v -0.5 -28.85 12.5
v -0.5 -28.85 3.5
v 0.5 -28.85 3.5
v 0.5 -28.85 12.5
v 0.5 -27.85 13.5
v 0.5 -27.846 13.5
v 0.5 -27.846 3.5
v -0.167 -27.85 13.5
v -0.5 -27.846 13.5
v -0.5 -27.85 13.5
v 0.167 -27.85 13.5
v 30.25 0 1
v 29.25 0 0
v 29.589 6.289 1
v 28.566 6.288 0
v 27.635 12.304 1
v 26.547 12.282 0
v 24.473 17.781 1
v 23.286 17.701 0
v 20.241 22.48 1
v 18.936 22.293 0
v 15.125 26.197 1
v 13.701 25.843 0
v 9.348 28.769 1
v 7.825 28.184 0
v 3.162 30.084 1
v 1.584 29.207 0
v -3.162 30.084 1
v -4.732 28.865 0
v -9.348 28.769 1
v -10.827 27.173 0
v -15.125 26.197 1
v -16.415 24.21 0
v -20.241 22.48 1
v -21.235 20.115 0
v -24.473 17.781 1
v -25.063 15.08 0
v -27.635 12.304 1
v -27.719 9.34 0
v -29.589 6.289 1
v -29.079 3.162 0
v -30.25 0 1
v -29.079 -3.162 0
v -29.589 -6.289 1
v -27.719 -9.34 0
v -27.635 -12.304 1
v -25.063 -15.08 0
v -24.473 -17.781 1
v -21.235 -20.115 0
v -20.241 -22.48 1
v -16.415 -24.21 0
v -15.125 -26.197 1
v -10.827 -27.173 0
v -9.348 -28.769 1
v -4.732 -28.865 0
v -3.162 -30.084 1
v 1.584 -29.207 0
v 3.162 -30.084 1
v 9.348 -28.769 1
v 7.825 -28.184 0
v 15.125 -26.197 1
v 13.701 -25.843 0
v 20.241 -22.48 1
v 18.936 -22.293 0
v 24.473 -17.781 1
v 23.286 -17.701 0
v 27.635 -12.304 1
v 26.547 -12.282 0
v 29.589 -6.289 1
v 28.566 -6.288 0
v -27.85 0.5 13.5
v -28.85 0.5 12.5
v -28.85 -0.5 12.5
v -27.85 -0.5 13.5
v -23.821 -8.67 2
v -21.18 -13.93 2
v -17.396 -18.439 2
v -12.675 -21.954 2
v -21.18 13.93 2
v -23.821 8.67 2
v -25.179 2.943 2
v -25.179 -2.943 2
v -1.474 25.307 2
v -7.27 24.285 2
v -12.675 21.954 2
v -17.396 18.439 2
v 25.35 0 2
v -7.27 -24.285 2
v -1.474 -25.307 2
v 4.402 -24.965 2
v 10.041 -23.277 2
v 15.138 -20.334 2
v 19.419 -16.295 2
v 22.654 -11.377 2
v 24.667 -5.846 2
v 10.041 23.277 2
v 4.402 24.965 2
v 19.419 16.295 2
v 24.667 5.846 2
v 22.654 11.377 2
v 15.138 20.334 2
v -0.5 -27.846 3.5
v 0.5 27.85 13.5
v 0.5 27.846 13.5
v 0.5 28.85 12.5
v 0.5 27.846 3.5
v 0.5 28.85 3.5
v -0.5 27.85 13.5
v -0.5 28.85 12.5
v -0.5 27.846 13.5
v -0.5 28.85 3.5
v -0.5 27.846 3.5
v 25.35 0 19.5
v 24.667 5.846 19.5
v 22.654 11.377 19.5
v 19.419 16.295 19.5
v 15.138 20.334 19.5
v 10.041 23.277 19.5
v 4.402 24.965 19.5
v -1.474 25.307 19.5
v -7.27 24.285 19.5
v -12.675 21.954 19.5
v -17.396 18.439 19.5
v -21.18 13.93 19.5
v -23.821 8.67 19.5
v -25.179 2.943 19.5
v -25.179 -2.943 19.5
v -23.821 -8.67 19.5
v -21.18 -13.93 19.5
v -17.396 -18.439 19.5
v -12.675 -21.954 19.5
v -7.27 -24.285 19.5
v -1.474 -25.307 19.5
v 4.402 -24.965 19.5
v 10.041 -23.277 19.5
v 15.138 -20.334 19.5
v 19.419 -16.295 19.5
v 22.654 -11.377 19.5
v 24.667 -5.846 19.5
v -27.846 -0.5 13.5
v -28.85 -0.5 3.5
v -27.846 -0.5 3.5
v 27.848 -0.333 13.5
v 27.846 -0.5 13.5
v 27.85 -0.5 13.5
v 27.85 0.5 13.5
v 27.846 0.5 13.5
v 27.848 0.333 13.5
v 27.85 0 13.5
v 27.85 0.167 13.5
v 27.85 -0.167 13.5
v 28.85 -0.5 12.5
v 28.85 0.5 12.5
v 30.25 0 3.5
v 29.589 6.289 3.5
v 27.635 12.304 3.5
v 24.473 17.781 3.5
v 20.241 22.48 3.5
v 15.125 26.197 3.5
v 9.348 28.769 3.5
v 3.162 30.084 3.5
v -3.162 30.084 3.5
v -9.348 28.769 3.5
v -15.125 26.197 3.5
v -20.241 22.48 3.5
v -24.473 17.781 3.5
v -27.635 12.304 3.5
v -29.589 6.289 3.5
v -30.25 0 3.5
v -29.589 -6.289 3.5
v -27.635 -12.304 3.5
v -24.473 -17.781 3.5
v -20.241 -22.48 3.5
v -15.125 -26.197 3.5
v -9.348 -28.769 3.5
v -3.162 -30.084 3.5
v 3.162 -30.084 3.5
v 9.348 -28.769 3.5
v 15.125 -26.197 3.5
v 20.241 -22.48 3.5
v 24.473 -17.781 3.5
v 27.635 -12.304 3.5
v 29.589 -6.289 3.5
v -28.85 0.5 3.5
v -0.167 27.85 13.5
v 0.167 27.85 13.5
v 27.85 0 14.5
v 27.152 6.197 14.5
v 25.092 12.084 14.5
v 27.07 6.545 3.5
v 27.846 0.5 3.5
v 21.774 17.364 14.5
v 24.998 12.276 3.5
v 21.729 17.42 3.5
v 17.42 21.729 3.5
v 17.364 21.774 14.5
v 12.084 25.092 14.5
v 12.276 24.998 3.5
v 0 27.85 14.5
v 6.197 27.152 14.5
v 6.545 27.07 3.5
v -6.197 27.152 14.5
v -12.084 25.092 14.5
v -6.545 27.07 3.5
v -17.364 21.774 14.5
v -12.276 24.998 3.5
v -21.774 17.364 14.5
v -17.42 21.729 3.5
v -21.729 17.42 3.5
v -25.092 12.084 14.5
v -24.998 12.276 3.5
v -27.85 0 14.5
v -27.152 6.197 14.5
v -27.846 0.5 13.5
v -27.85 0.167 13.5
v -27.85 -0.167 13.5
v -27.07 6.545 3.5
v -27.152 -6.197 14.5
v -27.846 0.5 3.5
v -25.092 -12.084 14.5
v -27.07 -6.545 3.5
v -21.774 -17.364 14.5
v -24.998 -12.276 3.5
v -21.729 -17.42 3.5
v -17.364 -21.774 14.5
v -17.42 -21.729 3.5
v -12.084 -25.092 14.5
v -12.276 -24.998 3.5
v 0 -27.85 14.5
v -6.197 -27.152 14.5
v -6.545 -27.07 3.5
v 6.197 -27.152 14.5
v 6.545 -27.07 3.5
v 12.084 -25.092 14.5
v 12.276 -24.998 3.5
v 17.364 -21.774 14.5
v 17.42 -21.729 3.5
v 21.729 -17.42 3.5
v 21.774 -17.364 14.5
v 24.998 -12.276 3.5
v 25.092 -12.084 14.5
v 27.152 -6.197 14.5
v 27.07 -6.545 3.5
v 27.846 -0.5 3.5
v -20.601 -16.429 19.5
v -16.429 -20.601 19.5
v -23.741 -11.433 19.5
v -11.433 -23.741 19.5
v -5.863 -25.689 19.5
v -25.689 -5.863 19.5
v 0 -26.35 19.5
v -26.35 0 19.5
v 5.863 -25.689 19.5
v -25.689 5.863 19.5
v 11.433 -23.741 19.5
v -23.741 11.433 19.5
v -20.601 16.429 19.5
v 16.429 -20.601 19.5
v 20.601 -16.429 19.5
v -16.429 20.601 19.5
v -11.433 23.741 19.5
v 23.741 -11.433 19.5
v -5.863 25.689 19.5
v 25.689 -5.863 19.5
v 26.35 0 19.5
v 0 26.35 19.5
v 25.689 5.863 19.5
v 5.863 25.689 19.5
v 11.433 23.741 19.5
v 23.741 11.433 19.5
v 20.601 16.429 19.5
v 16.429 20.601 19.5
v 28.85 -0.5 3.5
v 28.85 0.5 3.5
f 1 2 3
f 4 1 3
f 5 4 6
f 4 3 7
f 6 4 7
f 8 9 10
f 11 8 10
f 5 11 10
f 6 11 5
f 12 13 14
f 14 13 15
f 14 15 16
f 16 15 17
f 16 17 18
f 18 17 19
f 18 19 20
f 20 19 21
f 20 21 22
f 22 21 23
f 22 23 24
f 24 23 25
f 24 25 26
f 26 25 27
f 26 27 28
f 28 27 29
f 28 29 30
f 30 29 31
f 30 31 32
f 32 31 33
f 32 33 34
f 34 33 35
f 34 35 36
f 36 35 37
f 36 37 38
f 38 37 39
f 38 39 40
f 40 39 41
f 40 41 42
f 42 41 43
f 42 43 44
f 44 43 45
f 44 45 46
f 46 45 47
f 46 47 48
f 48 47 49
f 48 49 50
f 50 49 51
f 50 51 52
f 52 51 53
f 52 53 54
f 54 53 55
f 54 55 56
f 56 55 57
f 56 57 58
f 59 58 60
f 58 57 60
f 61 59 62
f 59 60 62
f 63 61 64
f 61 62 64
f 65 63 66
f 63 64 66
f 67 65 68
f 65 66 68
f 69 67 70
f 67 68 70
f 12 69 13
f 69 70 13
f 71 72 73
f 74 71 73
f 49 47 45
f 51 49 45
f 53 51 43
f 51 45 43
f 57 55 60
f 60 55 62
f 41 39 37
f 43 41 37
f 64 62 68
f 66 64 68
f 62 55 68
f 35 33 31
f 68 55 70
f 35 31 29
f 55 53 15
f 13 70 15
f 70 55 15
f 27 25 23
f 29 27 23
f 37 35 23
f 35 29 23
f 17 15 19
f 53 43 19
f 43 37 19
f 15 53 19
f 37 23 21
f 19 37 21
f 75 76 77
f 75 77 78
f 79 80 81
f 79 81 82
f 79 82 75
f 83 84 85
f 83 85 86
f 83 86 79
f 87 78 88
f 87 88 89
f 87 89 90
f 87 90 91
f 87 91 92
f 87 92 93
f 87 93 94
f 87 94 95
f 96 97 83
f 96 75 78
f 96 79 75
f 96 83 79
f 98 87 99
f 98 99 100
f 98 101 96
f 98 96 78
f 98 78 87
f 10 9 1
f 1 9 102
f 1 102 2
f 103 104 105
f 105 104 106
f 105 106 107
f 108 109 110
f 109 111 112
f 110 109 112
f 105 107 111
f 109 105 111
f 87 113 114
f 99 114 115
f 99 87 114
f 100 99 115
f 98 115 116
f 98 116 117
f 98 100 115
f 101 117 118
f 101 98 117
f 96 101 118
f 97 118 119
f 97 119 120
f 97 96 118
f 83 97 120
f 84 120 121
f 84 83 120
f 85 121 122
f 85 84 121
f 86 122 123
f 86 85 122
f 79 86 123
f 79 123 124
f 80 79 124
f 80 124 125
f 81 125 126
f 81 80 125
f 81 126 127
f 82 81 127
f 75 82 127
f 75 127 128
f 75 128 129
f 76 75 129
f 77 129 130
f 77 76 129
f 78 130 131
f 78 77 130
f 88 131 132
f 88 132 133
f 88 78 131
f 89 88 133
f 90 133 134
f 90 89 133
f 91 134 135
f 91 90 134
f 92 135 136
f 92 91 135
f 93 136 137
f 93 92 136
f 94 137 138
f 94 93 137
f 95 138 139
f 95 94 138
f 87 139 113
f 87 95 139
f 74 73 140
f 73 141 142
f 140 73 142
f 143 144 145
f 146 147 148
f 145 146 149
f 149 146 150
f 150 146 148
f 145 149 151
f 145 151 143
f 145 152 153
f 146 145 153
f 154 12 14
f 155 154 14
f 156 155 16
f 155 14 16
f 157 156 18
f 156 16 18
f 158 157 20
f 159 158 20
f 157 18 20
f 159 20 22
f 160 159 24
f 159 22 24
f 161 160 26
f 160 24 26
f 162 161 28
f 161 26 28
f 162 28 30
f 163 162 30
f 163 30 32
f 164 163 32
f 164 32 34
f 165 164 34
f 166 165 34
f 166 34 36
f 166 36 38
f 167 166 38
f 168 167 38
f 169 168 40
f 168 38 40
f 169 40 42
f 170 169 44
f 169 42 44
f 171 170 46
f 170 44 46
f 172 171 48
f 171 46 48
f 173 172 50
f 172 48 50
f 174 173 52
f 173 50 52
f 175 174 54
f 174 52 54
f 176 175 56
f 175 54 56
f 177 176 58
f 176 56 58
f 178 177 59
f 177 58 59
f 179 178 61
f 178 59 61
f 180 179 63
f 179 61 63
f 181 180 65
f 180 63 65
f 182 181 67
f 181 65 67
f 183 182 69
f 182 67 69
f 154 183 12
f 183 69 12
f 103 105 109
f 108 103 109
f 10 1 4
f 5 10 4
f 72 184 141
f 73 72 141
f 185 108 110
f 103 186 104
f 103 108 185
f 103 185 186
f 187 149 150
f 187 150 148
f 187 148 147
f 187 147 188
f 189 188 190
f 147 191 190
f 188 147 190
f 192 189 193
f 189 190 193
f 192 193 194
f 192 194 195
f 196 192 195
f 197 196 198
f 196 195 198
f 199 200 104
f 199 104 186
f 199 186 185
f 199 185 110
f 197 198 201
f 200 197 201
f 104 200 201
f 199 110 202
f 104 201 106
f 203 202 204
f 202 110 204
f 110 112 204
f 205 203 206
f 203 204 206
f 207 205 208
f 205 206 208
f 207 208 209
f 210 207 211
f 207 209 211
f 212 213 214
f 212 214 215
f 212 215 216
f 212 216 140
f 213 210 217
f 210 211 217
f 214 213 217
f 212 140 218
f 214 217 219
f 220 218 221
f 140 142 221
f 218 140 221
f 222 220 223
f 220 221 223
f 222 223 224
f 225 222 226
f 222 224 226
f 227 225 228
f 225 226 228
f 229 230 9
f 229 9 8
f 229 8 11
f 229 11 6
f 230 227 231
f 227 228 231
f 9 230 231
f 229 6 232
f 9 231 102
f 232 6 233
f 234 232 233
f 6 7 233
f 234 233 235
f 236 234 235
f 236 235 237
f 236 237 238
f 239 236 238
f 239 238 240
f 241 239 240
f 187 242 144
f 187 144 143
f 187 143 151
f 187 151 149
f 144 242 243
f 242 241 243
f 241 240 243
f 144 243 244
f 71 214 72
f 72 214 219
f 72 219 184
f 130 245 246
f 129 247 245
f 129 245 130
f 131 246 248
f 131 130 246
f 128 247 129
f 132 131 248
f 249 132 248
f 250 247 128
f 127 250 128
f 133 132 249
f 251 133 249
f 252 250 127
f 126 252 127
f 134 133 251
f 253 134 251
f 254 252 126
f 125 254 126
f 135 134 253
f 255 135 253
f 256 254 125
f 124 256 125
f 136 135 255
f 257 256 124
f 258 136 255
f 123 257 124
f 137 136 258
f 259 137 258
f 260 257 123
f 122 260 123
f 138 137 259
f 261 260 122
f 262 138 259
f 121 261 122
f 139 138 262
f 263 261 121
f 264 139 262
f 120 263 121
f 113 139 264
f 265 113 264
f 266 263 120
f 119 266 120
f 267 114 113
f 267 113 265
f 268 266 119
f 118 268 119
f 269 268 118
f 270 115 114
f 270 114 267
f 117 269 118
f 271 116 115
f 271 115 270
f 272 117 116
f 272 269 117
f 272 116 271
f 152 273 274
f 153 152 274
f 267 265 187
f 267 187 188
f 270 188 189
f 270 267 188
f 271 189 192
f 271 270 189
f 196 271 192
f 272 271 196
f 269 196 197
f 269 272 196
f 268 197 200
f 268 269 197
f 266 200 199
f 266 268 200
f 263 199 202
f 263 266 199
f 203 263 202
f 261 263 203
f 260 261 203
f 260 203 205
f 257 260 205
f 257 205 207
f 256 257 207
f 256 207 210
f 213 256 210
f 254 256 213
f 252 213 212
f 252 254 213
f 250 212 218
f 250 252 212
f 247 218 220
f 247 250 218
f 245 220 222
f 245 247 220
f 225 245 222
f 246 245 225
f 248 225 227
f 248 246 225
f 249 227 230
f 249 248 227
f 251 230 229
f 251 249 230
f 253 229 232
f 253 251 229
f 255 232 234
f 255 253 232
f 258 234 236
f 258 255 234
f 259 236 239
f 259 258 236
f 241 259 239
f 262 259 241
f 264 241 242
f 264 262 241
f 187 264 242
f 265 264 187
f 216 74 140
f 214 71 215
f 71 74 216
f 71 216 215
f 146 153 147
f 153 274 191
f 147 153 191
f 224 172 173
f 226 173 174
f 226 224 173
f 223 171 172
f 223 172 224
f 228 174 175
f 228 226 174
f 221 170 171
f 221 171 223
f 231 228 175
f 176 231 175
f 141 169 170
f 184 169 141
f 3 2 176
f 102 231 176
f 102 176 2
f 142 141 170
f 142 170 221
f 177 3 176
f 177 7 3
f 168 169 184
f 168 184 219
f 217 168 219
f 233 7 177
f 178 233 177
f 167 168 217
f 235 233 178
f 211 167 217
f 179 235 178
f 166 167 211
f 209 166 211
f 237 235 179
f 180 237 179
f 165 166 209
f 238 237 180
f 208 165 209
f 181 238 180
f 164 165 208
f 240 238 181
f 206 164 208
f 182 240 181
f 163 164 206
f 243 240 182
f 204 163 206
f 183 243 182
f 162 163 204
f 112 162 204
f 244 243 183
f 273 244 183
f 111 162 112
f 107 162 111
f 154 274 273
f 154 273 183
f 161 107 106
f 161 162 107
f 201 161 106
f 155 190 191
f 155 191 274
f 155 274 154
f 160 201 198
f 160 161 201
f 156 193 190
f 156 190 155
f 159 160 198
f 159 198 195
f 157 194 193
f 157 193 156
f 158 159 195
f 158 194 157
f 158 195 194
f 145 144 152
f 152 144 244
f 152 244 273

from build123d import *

# Parameters (mm, degrees)
F0_R      = 30.25
F1_DEPTH  = 3.5
F3_R      = 27.85
F3_R_2    = 25.35
F4_DEPTH  = 10
F5_DEPTH  = 6
F6_SIZE2  = 1.5
F6_SIZE   = 5
F8_DEPTH  = 10
F9_SIZE   = 0.99999
F10_DEPTH = 1.5
F11_SIZE  = 1


# Not quite as in the source:
# - a fillet or chamfer is up to 0.001 mm smaller than in the source, because OpenCascade refuses the exact size


with BuildPart() as f1:
    # F0 (on Top) → F1 (new body)
    with BuildSketch(Plane.XY):
        Circle(F0_R)
    extrude(amount=F1_DEPTH)

    # F3 (on face) → F4 (join)
    with BuildSketch(Plane.XY.offset(3.5)):
        Circle(F3_R)
        Circle(F3_R_2, mode=Mode.SUBTRACT)
    extrude(amount=F4_DEPTH)

    # F5 (add): a face of the model
    f5_faces = [f1.faces().sort_by_distance(p)[0] for p in [
        (-27.0622830458, 0, 13.5),
    ]]
    extrude(f5_faces, amount=F5_DEPTH)

    # F6
    f6_edges = [f1.edges().sort_by_distance(p)[0] for p in [
        (-27.85, 0, 19.5),
    ]]
    f6_side = f1.faces().sort_by_distance((-27.85, 0, 11.5))[0]
    chamfer(f6_edges, length=F6_SIZE, length2=F6_SIZE2, reference=f6_side)

    # F7 (on face) → F8 (join)
    with BuildSketch(Plane.XY.offset(3.5)):
        with BuildLine():
            ThreePointArc((27.85, 0), (27.8488778044, -0.250010074), (27.8455113079, -0.5))
            Line((27.8455113079, -0.5), (28.85, -0.5))
            Line((28.85, -0.5), (28.85, 0.5))
            Line((28.85, 0.5), (27.8455113079, 0.5))
            ThreePointArc((27.8455113079, 0.5), (27.8488778044, 0.250010074), (27.85, 0))
        make_face()
        with BuildLine():
            Line((-28.85, -0.5), (-27.8455113079, -0.5))
            ThreePointArc((-27.8455113079, -0.5), (-27.85, 0), (-27.8455113079, 0.5))
            Line((-27.8455113079, 0.5), (-28.85, 0.5))
            Line((-28.85, 0.5), (-28.85, -0.5))
        make_face()
        with BuildLine():
            Line((-0.5, -28.85), (0.5, -28.85))
            Line((0.5, -28.85), (0.5, -27.8455113079))
            ThreePointArc((0.5, -27.8455113079), (0, -27.85), (-0.5, -27.8455113079))
            Line((-0.5, -27.8455113079), (-0.5, -28.85))
        make_face()
        with BuildLine():
            ThreePointArc((-0.5, 27.8455113079), (0, 27.85), (0.5, 27.8455113079))
            Line((0.5, 27.8455113079), (0.5, 28.85))
            Line((0.5, 28.85), (-0.5, 28.85))
            Line((-0.5, 28.85), (-0.5, 27.8455113079))
        make_face()
    extrude(amount=F8_DEPTH)

    # F9 (size 1 in the source; OpenCascade refuses exactly that, so slightly less here)
    f9_edges = [f1.edges().sort_by_distance(p)[0] for p in [
        (28.85, 0, 13.5),
        (0, 28.85, 13.5),
        (-28.85, 0, 13.5),
        (0, -28.85, 13.5),
    ]]
    chamfer(f9_edges, length=F9_SIZE)

    # F10 (cut): a face of the model
    f10_faces = [f1.faces().sort_by_distance(p)[0] for p in [
        (0, 0, 3.5),
    ]]
    extrude(f10_faces, amount=-F10_DEPTH, mode=Mode.SUBTRACT)

    # F11
    f11_edges = [f1.edges().sort_by_distance(p)[0] for p in [
        (-30.25, 0, 0),
    ]]
    chamfer(f11_edges, length=F11_SIZE)


solid = f1.part
